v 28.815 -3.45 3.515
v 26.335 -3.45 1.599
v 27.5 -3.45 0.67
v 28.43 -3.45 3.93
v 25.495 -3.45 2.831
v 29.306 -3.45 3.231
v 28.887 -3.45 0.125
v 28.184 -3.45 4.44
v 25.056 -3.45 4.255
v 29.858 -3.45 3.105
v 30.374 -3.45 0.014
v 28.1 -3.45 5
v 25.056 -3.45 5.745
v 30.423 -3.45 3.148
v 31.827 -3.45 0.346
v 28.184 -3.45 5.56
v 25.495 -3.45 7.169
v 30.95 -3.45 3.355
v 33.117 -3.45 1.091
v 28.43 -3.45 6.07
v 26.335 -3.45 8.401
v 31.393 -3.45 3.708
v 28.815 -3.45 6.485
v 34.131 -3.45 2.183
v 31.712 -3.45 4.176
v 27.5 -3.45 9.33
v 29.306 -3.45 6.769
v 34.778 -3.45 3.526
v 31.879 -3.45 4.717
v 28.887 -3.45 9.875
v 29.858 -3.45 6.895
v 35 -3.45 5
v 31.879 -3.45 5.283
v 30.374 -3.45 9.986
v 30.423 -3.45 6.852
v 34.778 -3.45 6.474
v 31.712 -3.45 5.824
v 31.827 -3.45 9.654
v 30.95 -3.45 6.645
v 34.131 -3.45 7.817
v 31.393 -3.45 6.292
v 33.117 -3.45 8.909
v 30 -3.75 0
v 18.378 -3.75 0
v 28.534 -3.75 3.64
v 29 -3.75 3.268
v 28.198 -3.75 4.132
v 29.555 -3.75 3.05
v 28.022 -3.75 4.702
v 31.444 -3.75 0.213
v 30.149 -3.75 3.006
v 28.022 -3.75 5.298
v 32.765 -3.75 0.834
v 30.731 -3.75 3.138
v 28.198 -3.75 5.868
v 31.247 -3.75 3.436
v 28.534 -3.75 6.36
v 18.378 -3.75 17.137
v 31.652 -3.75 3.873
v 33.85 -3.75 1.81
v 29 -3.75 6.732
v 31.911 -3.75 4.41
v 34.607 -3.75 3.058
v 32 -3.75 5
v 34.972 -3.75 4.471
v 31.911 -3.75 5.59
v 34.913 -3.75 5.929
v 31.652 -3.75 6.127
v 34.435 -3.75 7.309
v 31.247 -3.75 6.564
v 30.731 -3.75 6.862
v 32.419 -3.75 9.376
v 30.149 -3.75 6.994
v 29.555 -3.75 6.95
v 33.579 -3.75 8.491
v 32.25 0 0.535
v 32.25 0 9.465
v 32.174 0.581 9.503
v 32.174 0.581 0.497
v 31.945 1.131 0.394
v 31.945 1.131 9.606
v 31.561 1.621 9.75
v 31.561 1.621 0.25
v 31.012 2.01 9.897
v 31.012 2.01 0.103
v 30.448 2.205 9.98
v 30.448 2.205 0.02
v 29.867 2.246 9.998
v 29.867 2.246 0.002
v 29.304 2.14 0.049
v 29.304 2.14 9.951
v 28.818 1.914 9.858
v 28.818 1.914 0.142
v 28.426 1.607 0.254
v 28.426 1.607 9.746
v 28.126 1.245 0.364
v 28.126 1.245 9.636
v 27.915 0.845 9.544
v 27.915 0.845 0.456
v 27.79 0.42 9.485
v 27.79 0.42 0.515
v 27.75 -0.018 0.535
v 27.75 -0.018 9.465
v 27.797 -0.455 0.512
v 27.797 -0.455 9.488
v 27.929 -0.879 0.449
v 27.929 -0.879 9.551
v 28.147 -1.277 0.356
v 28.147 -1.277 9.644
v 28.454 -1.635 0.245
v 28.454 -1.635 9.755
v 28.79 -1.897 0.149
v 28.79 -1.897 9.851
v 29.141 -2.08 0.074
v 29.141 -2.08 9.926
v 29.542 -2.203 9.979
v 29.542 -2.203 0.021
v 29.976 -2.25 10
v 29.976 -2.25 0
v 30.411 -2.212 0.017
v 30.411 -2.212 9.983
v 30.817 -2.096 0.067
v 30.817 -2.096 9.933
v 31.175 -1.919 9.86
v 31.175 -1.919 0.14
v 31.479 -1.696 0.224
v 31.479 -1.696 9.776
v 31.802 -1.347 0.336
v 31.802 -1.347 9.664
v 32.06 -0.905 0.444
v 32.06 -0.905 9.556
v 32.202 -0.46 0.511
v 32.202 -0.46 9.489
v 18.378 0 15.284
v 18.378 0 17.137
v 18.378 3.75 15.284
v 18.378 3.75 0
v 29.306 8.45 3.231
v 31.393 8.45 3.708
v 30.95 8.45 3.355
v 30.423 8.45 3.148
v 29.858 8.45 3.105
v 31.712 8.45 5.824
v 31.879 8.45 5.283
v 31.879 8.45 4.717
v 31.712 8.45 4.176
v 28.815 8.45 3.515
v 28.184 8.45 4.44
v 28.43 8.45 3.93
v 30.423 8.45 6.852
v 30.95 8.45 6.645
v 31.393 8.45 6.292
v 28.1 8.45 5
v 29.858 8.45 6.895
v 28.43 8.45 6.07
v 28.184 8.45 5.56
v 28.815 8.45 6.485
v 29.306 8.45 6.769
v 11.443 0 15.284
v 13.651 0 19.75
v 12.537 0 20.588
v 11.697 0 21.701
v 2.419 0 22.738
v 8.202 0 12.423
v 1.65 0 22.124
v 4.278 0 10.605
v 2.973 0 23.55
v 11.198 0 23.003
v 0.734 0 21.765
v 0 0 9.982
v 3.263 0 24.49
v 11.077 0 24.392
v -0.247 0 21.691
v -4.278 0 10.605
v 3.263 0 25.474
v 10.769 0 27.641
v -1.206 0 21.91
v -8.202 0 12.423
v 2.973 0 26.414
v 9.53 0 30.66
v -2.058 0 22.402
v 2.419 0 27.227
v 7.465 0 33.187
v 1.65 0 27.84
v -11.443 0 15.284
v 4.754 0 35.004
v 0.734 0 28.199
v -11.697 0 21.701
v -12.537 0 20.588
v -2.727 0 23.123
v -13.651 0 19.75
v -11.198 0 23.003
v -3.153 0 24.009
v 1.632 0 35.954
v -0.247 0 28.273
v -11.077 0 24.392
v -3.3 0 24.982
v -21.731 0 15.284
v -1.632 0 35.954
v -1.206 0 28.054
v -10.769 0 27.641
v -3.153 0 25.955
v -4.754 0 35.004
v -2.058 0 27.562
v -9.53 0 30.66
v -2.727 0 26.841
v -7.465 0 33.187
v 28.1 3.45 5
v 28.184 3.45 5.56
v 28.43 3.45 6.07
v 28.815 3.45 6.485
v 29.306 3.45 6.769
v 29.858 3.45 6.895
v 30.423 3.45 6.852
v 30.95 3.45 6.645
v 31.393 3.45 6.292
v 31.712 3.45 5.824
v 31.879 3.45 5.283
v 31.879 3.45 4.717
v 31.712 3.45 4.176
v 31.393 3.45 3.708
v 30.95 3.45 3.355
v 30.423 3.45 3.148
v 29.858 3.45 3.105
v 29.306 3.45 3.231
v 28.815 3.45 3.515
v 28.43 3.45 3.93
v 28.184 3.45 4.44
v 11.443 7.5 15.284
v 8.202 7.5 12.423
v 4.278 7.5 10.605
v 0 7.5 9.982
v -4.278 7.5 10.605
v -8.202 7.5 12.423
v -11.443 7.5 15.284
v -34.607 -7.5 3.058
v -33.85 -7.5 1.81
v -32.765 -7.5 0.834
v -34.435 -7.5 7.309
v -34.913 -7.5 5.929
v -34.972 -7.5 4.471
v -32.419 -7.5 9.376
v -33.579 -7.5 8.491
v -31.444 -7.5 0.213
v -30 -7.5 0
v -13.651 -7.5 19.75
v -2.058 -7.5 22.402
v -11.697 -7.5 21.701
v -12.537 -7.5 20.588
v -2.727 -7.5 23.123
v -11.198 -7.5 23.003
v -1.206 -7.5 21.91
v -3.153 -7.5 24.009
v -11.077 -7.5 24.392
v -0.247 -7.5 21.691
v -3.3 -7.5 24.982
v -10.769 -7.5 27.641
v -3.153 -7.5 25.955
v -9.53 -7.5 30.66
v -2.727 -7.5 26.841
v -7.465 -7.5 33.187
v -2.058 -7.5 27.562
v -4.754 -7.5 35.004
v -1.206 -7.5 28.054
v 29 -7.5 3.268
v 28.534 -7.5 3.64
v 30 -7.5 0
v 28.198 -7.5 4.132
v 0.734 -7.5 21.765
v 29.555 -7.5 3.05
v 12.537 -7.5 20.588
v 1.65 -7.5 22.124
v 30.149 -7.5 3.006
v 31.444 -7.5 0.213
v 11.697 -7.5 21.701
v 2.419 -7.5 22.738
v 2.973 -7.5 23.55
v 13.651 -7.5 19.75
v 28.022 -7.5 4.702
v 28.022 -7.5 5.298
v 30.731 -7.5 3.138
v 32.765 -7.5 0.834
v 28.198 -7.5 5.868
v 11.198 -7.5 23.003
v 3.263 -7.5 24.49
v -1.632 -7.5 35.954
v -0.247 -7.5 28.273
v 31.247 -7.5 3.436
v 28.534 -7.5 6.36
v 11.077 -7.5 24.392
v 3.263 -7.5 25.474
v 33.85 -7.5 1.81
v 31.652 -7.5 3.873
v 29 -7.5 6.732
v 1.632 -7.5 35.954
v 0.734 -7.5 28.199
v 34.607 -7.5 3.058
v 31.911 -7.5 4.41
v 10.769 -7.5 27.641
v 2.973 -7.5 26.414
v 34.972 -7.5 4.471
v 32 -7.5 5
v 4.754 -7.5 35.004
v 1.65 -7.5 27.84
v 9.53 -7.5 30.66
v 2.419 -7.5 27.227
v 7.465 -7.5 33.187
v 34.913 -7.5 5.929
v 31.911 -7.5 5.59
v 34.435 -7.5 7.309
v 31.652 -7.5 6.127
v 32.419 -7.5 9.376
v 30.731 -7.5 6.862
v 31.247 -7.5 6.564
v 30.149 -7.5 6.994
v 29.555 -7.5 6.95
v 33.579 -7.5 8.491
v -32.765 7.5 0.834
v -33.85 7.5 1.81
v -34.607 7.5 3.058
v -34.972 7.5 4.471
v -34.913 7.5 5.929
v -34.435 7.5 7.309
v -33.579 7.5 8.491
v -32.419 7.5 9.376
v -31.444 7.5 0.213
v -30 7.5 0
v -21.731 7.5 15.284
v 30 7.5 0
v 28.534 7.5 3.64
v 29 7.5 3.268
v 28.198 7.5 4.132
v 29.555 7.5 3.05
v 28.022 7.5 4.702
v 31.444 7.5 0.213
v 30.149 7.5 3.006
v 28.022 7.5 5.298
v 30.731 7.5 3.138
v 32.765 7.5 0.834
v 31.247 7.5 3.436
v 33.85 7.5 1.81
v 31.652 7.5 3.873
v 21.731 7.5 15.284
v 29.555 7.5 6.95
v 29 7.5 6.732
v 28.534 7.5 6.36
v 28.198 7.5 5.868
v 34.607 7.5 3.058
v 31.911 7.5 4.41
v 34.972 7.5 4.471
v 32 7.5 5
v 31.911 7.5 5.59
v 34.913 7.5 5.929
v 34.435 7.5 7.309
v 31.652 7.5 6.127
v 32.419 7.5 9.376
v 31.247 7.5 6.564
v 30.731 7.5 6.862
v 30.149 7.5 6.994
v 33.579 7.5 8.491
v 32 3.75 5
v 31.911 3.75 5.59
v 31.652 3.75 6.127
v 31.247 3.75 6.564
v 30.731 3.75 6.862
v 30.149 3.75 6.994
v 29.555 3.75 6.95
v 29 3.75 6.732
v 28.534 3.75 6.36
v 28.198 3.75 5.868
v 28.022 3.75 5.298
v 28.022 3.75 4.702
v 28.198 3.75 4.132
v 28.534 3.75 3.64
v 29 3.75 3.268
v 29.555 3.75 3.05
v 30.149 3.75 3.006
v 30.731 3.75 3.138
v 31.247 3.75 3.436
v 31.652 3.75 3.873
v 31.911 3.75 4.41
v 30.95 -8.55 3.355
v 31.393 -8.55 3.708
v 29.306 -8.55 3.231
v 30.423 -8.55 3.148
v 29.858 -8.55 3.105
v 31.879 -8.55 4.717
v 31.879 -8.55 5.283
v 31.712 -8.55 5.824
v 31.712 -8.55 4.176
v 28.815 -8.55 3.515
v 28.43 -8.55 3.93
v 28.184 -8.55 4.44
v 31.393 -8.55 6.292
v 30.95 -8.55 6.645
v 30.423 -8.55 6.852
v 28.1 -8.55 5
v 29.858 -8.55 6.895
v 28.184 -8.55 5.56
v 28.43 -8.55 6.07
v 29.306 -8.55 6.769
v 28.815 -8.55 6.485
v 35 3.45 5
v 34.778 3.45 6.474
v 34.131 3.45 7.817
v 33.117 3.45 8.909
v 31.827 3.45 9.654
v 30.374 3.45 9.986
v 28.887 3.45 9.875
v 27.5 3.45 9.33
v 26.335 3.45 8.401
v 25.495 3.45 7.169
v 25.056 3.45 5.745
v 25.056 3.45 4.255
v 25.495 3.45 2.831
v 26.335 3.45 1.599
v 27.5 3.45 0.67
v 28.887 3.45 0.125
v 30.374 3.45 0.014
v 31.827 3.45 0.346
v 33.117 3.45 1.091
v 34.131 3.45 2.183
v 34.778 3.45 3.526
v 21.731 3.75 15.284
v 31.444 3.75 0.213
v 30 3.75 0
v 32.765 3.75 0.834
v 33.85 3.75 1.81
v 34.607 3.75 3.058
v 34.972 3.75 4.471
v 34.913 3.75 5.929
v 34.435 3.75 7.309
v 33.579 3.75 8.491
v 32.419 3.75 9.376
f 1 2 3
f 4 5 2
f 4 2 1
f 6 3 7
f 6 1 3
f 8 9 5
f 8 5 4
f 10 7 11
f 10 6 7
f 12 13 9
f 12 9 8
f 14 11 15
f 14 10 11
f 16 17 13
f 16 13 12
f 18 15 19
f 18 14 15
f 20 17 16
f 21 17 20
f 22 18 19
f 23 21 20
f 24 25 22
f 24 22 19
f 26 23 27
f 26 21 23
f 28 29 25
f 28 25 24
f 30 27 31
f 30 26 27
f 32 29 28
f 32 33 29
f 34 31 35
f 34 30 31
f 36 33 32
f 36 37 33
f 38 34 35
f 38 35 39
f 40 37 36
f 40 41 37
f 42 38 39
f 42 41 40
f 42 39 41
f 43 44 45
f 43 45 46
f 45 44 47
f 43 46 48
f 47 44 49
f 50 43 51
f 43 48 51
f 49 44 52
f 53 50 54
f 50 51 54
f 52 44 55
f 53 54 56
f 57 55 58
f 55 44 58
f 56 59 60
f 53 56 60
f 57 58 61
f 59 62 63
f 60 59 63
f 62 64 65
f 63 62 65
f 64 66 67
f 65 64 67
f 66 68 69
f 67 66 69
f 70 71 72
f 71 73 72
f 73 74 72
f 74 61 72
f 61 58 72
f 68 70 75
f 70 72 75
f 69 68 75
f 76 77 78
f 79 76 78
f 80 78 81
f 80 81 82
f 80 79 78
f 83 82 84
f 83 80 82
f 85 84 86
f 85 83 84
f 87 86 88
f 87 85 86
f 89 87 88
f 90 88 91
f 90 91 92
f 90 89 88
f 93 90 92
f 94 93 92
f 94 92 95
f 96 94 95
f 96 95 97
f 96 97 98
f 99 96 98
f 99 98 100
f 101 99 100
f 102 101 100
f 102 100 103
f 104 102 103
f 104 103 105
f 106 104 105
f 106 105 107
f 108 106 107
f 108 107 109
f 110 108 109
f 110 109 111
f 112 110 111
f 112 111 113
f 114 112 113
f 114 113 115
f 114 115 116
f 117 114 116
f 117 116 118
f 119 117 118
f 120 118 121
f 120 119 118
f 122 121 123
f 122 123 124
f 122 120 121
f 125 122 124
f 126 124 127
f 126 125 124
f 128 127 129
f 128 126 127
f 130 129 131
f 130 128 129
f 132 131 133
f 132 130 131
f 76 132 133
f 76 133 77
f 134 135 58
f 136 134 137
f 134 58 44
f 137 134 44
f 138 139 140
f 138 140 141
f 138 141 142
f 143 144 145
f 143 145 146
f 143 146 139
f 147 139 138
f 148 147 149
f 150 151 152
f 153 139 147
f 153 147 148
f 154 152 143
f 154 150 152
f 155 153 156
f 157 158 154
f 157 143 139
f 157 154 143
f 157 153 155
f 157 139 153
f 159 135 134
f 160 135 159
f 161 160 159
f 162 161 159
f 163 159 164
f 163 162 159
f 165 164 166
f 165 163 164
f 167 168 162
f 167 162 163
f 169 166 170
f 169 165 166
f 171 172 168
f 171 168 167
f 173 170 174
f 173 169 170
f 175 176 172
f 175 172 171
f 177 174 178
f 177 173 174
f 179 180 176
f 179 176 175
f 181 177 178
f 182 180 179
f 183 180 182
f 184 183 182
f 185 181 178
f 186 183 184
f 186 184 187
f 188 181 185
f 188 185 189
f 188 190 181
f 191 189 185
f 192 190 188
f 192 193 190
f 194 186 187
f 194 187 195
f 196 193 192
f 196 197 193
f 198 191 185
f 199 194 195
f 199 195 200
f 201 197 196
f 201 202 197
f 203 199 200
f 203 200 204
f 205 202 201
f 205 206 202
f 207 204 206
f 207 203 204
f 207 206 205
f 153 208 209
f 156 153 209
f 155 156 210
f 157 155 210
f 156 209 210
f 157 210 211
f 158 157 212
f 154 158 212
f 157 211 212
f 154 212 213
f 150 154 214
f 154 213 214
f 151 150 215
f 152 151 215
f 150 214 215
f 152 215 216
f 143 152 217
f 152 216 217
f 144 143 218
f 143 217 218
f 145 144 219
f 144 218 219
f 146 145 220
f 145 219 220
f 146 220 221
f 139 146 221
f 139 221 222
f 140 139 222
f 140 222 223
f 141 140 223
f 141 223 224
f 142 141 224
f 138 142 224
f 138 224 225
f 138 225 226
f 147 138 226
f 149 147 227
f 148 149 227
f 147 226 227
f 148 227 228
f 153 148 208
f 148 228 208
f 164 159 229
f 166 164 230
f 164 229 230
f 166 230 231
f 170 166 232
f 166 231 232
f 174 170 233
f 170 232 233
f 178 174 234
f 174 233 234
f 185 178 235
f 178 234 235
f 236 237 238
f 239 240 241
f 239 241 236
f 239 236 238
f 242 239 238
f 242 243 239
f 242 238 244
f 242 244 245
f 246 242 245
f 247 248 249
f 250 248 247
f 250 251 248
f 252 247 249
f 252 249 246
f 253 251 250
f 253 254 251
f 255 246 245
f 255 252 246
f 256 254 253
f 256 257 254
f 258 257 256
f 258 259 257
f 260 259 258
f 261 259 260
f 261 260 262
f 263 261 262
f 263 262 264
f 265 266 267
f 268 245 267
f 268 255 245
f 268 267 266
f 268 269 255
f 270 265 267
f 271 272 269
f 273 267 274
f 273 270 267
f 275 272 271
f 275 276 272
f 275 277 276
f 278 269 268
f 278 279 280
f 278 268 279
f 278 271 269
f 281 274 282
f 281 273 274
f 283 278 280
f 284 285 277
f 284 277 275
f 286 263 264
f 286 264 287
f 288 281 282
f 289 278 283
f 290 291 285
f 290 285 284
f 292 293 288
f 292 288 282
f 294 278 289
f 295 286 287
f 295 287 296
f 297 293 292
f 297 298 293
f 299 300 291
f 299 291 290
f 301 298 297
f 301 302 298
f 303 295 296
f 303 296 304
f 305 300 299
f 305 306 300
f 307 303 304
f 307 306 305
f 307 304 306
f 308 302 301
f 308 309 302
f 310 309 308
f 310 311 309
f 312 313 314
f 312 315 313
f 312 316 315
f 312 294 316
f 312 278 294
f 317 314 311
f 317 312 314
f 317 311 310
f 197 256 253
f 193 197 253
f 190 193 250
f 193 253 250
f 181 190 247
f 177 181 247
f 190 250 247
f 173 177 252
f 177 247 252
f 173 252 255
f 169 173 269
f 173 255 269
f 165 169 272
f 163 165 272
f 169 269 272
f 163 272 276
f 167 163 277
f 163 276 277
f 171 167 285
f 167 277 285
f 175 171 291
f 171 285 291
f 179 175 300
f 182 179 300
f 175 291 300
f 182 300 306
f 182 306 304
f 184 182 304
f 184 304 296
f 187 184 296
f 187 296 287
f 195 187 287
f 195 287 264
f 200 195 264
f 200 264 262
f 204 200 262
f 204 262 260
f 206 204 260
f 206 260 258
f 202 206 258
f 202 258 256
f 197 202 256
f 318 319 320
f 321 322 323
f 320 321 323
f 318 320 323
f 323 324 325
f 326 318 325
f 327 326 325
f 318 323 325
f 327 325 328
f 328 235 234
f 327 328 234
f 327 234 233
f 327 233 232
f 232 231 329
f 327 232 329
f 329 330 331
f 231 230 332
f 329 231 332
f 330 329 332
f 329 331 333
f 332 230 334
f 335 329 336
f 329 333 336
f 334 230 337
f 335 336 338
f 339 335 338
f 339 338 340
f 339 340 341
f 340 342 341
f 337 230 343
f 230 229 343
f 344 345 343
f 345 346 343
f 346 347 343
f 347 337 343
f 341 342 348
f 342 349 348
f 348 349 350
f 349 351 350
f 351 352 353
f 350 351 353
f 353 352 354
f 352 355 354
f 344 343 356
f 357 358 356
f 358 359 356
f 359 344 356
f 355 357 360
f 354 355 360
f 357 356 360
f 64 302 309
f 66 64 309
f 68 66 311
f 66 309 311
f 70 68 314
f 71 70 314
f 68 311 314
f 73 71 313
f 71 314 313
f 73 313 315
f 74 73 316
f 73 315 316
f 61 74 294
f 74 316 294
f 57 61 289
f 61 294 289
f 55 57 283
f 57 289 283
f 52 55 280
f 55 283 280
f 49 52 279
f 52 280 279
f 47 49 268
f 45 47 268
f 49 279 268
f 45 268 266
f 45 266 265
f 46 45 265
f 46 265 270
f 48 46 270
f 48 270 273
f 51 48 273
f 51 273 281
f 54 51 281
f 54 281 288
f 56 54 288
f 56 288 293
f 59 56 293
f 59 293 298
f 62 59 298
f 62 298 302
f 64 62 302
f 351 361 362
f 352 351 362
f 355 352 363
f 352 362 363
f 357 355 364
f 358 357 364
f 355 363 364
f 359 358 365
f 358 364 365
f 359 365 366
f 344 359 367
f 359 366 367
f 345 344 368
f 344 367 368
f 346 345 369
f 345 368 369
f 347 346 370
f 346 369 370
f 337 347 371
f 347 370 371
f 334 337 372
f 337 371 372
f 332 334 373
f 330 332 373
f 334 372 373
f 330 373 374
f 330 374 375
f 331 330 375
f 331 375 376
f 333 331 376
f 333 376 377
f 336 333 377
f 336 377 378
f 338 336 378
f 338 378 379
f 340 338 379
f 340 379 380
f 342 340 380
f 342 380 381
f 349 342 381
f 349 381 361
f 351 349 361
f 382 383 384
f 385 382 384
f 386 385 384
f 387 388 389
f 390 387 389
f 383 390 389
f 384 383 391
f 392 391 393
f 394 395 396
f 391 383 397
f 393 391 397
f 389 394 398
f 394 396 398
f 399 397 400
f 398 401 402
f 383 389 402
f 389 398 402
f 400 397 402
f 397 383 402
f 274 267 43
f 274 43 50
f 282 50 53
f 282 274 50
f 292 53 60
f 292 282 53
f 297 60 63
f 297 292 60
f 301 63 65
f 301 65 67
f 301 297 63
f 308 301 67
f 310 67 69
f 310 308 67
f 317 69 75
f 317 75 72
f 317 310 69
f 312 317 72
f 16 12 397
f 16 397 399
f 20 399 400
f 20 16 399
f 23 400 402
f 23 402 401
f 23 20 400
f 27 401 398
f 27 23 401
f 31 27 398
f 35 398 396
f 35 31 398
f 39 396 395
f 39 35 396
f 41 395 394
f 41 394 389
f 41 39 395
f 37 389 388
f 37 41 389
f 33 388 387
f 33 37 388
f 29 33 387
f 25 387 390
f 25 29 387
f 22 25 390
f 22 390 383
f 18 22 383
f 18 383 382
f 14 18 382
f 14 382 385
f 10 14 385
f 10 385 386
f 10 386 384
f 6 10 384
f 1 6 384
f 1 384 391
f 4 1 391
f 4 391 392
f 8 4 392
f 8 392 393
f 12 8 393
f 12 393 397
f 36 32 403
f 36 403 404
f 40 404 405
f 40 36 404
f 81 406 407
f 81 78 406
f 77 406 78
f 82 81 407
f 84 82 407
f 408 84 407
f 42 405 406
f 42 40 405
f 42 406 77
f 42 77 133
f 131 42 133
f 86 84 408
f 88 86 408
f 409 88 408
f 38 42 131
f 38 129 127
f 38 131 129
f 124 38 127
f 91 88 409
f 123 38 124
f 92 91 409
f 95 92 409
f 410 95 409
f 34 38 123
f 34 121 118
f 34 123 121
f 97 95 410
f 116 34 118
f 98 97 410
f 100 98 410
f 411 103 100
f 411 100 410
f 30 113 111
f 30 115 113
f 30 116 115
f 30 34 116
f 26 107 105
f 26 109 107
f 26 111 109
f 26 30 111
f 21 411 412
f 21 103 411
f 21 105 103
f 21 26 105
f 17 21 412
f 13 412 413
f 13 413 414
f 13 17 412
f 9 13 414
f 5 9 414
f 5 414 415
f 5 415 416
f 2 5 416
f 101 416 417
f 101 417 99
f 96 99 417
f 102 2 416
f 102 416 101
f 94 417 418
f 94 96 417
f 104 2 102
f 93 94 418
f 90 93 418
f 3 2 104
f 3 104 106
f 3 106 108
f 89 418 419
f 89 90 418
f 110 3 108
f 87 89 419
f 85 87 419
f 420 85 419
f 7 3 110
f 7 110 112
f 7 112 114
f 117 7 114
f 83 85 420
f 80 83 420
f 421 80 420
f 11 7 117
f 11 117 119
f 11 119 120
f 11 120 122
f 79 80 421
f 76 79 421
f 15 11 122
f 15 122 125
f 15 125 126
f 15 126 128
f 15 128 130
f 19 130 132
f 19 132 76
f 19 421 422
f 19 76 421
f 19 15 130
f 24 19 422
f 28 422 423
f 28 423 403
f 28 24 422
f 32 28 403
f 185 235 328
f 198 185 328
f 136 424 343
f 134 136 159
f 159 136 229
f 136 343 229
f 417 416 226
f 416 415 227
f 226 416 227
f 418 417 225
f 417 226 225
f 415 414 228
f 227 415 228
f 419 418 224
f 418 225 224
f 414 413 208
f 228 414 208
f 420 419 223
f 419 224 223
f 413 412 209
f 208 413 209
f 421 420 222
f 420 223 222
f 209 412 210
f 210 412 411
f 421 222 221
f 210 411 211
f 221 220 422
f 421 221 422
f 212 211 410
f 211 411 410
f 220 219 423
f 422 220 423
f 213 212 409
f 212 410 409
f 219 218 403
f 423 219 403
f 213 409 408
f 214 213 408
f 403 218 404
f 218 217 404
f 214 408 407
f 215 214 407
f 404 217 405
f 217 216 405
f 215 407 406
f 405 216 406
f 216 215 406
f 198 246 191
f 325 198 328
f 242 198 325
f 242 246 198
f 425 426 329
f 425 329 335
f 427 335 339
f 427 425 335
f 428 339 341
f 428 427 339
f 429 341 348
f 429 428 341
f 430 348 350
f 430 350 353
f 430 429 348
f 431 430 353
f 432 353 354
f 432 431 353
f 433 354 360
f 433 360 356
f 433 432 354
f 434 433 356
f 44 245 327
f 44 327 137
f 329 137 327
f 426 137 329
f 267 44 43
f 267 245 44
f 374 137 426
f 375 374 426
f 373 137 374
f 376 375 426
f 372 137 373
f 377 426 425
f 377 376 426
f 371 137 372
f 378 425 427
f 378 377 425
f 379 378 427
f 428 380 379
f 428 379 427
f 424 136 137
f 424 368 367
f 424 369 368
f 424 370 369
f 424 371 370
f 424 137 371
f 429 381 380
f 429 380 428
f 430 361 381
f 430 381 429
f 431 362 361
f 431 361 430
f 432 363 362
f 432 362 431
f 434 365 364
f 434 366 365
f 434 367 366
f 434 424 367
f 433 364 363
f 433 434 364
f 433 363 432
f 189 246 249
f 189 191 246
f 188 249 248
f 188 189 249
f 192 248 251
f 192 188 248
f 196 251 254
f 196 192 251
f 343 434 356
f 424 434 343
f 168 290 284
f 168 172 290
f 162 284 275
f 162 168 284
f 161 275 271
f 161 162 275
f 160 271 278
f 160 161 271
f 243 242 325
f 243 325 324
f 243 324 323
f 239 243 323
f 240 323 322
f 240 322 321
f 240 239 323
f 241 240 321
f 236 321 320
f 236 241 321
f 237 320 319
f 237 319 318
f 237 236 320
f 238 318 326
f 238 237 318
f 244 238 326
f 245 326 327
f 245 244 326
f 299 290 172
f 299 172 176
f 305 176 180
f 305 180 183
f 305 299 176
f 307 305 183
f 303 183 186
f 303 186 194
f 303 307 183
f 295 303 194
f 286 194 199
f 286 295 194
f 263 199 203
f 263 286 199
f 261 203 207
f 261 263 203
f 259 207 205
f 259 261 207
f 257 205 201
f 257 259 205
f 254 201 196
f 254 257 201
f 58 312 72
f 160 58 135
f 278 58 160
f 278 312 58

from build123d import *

# Parameters (mm, degrees)
F1_DEPTH       = 7.5
F3_DEPTH       = 7.5
F4_D           = 6.6
F6_R           = 5
F7_D           = 4
F10_DEPTH      = 3.75
F11_R          = 5
F12_DEPTH      = 3.45
F13_R          = 1.9
F14_DEPTH      = 5
F14_DEPTH_BACK = 12
F15_R          = 2.25
F16_DEPTH      = 36.0758576219


with BuildPart() as f1:
    # F0 (on Front) → F1 (new body, symmetric)
    with BuildSketch(Plane.XZ):
        with BuildLine():
            Line((-10.5246857001, 21.4779671239), (-32.4188262894, 9.3759889604))
            ThreePointArc((-32.4188262894, 9.3759889604), (-34.8414845245, 3.7509893519), (-30, 0))
            Line((-30, 0), (30, 0))
            ThreePointArc((30, 0), (34.8414845245, 3.7509893519), (32.4188262894, 9.3759889604))
            Line((32.4188262894, 9.3759889604), (10.5246857001, 21.4779671239))
            ThreePointArc((10.5246857001, 21.4779671239), (0, 36.0748576219), (-10.5246857001, 21.4779671239))
        make_face()
    extrude(amount=F1_DEPTH, both=True)

    # F2 (on face) → F3 (cut)
    with BuildSketch(Plane(origin=(0, 7.5, 0), x_dir=(-1, 0, 0), z_dir=(0, 1, 0))):
        with BuildLine():
            Line((29.3092999119, 15.2839452874), (11.0376879026, 35.1393811844))
            ThreePointArc((11.0376879026, 35.1393811844), (0, 39.9821450561), (-11.0376879026, 35.1393811844))
            Line((-11.0376879026, 35.1393811844), (-29.3092999119, 15.2839452874))
            Line((-29.3092999119, 15.2839452874), (-11.4431167628, 15.2839452874))
            ThreePointArc((-11.4431167628, 15.2839452874), (0, 9.9821450561), (11.4431167628, 15.2839452874))
            Line((11.4431167628, 15.2839452874), (29.3092999119, 15.2839452874))
        make_face()
    extrude(amount=-F3_DEPTH, mode=Mode.SUBTRACT)

    # F4 (through all)
    with Locations(Plane(origin=(0, 0, 0), x_dir=(1, 0, 0), z_dir=(0, 1, 0))):
        with Locations((0, -24.9821450561)):
            Hole(F4_D / 2)

    # F6
    f6_edges = [f1.edges().sort_by_distance(p)[0] for p in [
        (10.524686, -3.75, 21.477967),
        (-10.524686, -3.75, 21.477967),
    ]]
    fillet(f6_edges, radius=F6_R)

    # F7 (through all)
    with Locations(Plane(origin=(0, 7.5, 0), x_dir=(-1, 0, 0), z_dir=(0, 1, 0))):
        with Locations((-30, 5)):
            Hole(F7_D / 2)

    # F9 (on Front) → F10 (cut, symmetric)
    with BuildSketch(Plane.XZ):
        with BuildLine():
            Line((18.3783179199, 0), (30, 0))
            ThreePointArc((30, 0), (34.8414845245, 3.7509893519), (32.4188262894, 9.3759889604))
            Line((32.4188262894, 9.3759889604), (18.3783179199, 17.136874801))
            Line((18.3783179199, 17.136874801), (18.3783179199, 0))
        make_face()
    extrude(amount=F10_DEPTH, both=True, mode=Mode.SUBTRACT)


with BuildPart() as f12:
    # F11 (on Front) → F12 (new body, symmetric)
    with BuildSketch(Plane.XZ):
        with Locations((30, 5)):
            Circle(F11_R)
    extrude(amount=F12_DEPTH, both=True)

    # F13 (on face) → F14 (join, two sides)
    with BuildSketch(Plane(origin=(0, 3.45, 0), x_dir=(-1, 0, 0), z_dir=(0, 1, 0))) as f14_sk:
        with Locations((-30, 5)):
            Circle(F13_R)
    extrude(amount=F14_DEPTH)
    extrude(f14_sk.sketch, amount=-F14_DEPTH_BACK)

    # F15 (on Top) → F16 (cut, through all)
    with BuildSketch(Plane.XY):
        with Locations((30, 0)):
            Circle(F15_R)
    extrude(amount=F16_DEPTH, mode=Mode.SUBTRACT)


solid = Compound([f1.part, f12.part])
